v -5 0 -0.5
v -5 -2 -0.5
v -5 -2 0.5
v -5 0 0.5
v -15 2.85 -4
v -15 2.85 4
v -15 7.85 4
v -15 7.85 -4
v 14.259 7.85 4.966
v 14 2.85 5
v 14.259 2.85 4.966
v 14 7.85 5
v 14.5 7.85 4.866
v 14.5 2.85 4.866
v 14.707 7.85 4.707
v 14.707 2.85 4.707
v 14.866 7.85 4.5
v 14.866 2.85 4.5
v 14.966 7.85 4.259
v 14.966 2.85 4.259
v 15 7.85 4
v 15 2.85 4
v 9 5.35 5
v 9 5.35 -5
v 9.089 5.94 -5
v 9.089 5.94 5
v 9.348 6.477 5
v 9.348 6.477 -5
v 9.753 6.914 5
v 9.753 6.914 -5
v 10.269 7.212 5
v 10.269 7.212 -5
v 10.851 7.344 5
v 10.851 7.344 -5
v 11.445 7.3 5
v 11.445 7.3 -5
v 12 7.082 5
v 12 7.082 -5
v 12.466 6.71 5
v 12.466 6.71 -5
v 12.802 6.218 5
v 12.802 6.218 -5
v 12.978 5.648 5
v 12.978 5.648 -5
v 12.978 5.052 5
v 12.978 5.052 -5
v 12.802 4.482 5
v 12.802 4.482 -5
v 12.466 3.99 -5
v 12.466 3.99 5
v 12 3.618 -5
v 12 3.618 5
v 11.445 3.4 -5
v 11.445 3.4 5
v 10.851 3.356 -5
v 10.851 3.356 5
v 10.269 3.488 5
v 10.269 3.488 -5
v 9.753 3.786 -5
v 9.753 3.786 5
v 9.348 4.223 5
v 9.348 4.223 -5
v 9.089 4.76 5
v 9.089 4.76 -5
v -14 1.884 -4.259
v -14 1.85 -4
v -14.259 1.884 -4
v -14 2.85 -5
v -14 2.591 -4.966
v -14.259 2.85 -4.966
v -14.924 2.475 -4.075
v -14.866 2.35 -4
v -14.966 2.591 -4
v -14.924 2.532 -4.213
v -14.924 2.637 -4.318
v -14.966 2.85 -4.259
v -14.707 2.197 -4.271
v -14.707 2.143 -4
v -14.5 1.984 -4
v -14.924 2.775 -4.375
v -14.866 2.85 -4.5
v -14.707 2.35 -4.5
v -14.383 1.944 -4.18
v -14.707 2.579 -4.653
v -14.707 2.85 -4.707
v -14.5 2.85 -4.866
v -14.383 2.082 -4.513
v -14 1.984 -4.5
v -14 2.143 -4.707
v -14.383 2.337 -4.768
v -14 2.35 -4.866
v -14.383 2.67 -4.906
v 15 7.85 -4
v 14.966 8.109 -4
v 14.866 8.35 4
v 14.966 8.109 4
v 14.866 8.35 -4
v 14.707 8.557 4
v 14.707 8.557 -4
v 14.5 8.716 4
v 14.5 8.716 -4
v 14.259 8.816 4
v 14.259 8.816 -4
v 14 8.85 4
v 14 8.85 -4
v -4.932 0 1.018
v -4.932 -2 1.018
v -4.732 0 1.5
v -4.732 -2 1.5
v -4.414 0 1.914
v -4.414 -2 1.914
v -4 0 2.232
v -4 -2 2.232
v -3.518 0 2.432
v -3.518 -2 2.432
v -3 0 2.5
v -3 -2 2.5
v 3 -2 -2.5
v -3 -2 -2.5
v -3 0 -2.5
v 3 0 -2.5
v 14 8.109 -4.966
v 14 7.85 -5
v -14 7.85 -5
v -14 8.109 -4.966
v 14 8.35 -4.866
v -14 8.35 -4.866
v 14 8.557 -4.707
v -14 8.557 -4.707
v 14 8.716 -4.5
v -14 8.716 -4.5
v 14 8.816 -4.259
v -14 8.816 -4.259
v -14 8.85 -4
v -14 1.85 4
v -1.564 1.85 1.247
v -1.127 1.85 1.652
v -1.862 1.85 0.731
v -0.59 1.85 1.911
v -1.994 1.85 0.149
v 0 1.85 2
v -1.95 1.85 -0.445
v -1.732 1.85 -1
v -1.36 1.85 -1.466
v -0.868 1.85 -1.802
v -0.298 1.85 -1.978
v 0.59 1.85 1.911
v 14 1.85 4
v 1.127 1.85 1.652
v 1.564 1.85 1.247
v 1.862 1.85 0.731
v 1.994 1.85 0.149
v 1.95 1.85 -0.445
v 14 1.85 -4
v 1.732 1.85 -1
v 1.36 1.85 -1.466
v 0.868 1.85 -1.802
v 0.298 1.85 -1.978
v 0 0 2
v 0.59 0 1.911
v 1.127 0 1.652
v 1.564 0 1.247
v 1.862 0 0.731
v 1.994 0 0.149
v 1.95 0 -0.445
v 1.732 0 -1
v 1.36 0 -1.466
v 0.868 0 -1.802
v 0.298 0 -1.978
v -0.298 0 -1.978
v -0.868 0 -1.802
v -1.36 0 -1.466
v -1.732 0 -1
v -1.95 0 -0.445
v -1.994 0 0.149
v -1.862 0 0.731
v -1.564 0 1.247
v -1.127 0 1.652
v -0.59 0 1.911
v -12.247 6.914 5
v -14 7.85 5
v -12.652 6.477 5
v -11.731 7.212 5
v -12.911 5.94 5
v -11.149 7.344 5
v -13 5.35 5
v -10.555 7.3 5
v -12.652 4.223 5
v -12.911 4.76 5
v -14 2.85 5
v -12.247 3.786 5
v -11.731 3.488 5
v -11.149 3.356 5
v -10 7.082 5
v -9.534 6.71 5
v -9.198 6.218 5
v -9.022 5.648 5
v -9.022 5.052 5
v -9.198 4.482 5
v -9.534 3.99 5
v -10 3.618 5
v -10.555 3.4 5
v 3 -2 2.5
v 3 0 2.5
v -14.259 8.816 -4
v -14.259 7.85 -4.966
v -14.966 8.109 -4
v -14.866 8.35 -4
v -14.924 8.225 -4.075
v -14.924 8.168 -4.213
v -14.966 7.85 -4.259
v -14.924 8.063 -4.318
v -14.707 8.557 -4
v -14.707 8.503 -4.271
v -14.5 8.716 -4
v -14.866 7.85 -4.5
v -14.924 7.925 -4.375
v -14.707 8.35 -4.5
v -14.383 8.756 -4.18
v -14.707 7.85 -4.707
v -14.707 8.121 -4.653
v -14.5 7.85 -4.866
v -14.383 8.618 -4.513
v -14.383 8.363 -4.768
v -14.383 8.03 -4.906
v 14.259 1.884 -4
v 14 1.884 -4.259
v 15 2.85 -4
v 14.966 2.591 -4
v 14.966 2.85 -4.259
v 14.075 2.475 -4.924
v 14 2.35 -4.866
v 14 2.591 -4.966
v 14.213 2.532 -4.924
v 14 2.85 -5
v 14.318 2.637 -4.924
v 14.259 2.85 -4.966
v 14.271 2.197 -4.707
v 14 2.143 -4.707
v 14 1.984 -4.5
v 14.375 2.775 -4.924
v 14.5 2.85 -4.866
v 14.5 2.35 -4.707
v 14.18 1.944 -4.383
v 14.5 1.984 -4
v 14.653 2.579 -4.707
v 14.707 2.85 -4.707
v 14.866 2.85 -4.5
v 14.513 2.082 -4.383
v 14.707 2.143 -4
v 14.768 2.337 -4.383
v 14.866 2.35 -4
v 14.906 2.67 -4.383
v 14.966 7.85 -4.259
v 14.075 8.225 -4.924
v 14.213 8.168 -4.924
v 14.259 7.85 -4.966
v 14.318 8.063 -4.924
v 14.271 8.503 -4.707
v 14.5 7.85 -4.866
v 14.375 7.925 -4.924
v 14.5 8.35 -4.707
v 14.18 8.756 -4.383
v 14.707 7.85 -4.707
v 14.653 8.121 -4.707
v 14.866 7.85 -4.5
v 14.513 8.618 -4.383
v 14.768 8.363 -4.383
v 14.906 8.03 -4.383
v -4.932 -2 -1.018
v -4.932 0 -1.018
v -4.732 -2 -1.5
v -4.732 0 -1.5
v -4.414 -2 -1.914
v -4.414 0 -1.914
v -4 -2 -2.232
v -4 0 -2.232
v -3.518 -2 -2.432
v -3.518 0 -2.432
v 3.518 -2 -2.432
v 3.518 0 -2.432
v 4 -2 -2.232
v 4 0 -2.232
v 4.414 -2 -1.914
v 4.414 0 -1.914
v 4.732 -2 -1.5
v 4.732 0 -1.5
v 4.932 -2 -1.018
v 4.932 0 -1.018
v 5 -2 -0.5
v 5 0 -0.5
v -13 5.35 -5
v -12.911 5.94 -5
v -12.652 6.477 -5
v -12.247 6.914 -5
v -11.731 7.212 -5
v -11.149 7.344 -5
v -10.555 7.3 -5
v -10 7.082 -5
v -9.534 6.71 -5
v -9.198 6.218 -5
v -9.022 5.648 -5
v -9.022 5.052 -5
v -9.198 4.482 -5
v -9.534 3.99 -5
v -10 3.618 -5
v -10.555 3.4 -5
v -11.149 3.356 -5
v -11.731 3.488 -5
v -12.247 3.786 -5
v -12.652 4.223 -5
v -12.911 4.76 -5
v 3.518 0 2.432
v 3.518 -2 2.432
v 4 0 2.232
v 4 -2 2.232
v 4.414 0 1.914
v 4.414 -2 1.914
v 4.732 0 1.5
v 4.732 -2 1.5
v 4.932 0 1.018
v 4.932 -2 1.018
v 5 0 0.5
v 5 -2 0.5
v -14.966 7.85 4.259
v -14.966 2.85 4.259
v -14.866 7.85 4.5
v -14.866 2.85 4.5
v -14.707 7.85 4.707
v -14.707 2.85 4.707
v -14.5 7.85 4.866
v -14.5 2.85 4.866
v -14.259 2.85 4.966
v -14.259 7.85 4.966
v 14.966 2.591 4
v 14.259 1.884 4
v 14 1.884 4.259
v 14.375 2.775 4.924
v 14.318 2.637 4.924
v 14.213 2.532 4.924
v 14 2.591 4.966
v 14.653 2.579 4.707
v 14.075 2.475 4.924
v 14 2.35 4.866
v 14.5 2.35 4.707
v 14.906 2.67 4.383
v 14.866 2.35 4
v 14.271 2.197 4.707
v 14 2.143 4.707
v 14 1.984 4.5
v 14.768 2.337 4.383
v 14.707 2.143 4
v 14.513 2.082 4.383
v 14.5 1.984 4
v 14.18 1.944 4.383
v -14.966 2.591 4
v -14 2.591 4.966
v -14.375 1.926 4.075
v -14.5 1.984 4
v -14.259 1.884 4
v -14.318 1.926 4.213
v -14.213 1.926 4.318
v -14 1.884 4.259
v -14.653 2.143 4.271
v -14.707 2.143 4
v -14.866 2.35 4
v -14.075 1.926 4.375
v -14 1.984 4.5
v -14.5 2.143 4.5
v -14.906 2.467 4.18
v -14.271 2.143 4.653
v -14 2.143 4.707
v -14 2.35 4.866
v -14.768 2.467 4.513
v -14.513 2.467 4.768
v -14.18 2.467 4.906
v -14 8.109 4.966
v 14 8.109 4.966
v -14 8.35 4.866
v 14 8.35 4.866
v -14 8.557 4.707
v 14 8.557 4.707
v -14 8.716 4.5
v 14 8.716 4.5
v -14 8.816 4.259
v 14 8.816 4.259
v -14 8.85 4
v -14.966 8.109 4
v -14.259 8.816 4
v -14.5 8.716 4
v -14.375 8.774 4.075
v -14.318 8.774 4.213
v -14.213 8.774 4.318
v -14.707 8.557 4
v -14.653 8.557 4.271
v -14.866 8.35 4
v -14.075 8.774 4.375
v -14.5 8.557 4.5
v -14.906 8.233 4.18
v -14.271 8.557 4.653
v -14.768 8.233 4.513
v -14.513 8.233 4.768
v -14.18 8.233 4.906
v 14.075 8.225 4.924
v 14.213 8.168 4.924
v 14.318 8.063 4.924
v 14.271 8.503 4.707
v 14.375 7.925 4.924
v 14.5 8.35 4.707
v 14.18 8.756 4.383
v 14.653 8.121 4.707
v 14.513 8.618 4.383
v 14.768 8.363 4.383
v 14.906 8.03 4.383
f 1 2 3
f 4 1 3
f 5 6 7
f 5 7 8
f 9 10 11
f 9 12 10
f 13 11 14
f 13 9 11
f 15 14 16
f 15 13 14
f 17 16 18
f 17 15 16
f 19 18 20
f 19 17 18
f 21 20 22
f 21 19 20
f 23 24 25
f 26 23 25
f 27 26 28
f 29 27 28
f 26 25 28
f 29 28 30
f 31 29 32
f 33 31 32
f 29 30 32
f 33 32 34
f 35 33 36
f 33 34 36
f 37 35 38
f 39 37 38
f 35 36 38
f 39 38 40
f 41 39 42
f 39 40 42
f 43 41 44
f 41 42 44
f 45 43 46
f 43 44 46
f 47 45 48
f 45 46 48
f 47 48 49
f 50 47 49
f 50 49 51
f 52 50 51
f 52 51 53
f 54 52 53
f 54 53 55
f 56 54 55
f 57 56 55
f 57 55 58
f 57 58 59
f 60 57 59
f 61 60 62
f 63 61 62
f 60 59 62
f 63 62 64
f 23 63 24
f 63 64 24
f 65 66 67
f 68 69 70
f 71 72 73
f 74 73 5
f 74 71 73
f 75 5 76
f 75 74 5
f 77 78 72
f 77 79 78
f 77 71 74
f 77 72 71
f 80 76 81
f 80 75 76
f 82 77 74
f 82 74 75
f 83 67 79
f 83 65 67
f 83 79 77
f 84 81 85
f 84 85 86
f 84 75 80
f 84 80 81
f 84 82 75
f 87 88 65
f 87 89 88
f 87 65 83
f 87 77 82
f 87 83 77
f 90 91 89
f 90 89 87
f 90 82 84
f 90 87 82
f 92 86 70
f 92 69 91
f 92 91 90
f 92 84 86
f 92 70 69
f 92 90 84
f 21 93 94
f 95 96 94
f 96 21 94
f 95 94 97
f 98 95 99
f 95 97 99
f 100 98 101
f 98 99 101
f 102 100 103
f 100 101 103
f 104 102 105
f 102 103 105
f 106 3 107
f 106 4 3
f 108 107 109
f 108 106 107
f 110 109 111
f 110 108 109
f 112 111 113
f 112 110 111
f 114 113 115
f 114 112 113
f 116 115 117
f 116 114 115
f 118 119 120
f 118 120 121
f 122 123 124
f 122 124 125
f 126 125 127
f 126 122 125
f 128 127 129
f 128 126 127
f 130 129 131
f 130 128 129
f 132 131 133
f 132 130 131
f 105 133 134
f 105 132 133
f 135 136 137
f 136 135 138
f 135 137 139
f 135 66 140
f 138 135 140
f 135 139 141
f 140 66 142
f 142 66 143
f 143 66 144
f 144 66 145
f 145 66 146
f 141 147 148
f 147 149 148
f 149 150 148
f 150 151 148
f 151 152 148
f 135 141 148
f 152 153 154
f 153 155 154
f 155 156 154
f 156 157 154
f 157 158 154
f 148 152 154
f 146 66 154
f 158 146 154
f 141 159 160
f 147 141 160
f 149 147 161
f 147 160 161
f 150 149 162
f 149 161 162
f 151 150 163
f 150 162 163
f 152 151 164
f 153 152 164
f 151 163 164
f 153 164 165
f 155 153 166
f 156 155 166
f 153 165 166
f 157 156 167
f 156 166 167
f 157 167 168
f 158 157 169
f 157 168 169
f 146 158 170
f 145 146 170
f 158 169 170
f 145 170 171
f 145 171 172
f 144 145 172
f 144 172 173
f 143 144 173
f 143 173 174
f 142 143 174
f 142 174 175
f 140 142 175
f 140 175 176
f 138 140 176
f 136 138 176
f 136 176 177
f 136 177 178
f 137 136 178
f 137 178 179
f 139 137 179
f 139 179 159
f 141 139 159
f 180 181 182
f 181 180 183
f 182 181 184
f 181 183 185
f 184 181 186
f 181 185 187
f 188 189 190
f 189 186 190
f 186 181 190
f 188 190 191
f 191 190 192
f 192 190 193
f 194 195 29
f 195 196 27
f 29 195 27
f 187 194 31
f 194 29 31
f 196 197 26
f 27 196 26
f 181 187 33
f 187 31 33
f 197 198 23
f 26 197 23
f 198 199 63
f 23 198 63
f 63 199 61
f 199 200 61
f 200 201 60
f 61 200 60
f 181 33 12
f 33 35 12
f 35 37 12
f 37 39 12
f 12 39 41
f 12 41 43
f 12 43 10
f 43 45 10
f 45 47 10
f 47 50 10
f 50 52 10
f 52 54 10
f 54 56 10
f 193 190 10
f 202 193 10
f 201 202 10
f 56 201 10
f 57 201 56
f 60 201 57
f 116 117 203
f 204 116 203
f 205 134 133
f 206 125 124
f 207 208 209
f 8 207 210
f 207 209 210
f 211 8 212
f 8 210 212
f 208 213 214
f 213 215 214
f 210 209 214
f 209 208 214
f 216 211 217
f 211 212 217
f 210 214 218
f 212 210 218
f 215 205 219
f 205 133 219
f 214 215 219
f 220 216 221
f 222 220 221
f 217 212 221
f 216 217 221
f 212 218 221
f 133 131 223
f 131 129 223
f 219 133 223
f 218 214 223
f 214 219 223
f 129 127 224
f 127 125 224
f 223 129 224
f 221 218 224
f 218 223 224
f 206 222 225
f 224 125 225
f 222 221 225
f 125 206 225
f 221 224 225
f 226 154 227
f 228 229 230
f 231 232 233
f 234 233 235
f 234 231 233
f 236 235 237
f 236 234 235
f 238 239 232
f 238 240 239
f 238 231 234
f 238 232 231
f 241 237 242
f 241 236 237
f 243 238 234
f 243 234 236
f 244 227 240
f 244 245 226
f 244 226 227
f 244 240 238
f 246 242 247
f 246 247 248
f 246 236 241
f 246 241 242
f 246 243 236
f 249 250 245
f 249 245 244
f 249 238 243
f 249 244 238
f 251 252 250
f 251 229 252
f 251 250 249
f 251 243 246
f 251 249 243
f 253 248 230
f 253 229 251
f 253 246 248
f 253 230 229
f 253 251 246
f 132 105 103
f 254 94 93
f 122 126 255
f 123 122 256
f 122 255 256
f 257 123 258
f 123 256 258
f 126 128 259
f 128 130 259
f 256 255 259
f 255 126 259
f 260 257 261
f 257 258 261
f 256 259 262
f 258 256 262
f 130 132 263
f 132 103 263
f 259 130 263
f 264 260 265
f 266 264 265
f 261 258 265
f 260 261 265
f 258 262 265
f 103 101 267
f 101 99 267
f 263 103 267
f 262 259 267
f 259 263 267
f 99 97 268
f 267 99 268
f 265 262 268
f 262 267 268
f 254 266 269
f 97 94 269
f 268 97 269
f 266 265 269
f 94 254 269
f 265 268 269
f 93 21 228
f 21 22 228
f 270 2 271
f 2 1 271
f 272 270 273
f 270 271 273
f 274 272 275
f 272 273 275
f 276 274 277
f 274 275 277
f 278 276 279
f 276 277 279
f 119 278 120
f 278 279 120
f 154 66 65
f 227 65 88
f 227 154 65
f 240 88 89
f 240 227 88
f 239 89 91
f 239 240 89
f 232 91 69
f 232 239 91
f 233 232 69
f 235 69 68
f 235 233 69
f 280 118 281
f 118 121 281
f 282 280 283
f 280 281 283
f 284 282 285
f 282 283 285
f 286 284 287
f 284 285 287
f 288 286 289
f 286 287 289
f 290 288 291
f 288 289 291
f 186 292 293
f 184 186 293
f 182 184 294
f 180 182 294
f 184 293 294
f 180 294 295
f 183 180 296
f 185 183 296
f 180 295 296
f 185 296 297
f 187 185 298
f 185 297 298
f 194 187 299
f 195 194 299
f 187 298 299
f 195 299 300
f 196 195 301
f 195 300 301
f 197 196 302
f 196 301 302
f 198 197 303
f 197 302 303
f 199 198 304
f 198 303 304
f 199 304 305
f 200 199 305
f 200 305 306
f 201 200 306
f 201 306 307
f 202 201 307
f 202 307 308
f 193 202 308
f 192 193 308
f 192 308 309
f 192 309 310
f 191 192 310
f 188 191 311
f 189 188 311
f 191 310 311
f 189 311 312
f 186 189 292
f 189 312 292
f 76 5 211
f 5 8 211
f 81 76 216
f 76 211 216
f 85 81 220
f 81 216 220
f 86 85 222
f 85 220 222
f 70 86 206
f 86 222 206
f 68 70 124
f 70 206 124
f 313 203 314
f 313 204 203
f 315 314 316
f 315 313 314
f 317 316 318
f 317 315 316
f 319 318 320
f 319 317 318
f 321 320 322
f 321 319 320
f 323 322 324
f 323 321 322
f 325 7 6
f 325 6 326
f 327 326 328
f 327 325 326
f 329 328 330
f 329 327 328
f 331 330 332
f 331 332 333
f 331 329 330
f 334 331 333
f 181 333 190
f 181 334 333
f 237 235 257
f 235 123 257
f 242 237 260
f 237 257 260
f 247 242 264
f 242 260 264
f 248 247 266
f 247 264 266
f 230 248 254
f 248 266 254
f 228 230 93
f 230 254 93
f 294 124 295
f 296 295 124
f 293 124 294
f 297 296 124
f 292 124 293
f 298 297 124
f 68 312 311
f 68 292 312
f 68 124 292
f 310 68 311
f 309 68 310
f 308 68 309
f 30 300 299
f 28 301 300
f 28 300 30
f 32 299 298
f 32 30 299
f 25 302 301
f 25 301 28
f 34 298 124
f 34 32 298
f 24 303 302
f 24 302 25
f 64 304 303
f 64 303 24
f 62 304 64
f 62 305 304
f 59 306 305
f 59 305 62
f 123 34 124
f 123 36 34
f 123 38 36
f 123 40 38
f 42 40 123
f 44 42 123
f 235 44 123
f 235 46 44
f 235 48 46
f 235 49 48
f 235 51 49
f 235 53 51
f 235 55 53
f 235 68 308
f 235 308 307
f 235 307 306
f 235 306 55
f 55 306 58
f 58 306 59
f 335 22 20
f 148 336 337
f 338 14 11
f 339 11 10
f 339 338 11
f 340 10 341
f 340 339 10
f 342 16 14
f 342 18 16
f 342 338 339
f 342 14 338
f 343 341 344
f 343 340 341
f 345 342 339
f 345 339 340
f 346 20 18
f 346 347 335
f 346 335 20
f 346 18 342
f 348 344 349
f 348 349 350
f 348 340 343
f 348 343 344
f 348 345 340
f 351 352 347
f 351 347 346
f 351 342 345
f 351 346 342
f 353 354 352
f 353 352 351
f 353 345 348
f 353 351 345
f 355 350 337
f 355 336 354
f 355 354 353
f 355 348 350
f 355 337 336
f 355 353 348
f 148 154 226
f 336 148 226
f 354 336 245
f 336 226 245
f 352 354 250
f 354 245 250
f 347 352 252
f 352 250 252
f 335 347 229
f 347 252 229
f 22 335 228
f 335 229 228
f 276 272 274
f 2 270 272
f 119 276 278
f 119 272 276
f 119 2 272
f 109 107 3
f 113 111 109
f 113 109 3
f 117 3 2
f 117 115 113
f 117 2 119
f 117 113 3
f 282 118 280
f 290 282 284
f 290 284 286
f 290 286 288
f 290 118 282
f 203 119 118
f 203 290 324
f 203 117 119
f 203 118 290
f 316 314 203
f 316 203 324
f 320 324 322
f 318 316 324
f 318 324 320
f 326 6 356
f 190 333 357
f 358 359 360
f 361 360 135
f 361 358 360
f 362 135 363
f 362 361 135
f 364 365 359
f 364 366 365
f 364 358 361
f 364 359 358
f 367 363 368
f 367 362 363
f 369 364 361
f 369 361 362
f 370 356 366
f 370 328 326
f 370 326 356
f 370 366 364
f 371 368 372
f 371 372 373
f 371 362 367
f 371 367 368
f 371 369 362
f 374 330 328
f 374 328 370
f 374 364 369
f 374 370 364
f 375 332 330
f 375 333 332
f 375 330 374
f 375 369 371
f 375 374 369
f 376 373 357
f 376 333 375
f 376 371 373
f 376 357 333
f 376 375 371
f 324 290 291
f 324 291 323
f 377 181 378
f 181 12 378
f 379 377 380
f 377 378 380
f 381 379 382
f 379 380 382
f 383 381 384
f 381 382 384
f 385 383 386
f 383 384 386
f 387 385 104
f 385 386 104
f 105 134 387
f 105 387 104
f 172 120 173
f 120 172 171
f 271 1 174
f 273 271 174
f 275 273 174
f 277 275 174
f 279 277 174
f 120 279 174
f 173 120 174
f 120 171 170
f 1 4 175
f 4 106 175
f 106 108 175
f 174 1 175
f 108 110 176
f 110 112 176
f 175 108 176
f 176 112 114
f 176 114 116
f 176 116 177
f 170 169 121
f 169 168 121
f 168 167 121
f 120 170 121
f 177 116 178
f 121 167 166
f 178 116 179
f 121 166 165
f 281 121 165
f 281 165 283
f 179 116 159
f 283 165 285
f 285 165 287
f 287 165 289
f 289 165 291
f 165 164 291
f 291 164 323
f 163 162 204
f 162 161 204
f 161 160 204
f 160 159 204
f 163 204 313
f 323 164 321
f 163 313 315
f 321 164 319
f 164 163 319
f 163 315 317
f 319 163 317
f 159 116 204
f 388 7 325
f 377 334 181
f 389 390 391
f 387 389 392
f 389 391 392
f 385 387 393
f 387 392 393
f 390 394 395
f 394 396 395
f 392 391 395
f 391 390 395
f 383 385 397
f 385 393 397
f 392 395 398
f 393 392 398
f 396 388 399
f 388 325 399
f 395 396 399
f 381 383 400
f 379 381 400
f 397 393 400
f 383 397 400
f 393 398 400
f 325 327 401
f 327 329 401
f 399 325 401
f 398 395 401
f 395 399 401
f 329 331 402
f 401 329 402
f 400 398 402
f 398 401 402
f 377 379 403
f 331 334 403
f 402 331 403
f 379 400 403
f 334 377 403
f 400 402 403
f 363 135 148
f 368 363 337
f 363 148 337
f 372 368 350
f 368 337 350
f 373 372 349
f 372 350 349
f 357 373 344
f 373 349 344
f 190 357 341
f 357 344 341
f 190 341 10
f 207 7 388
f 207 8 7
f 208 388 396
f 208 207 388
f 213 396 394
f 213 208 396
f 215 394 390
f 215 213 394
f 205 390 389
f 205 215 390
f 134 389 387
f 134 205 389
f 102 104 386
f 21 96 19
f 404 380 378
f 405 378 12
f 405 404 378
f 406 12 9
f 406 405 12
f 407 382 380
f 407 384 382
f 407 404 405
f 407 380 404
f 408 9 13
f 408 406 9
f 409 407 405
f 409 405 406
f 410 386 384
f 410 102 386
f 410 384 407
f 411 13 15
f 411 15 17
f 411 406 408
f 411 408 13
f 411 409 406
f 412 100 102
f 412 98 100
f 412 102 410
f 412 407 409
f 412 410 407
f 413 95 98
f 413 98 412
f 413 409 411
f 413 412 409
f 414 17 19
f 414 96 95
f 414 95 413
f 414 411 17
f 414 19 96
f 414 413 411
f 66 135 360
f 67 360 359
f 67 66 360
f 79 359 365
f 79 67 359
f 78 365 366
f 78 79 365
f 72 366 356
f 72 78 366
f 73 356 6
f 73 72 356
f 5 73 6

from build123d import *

# Parameters (mm, degrees)
BOSS_EXTRUDE1_DEPTH      = 1.85
BOSS_EXTRUDE1_DEPTH_BACK = 2
SKETCH1_R                = 2
SKETCH3_W                = 30
SKETCH3_H                = 10
BOSS_EXTRUDE3_DEPTH      = 7
SKETCH7_W                = 10
SKETCH7_H                = 5
BOSS_EXTRUDE7_DEPTH      = 2
FILLET2_R                = 2
SKETCH9_R                = 2
CUT_EXTRUDE3_DEPTH       = 10
FILLET3_R                = 1


with BuildPart() as part:
    # Sketch1 → Boss-Extrude1 (new, two sides: drawn at the far end of the back side and taken through both)
    with BuildSketch(Plane(origin=(0, 0, 0), x_dir=(1, 0, 0), z_dir=(0, 1, 0)).offset(-BOSS_EXTRUDE1_DEPTH_BACK)):
        with Locations(Location((0, 0, 0), (0, 0, 270))):
            Circle(SKETCH1_R)
    extrude(amount=BOSS_EXTRUDE1_DEPTH + BOSS_EXTRUDE1_DEPTH_BACK)

    # Sketch3 → Boss-Extrude3 (add)
    with BuildSketch(Plane(origin=(0, 1.85, 0), x_dir=(1, 0, 0), z_dir=(0, 1, 0))):
        Rectangle(SKETCH3_W, SKETCH3_H)
    extrude(amount=BOSS_EXTRUDE3_DEPTH)

    # Sketch7 → Boss-Extrude7 (add)
    with BuildSketch(Plane.XZ.offset(2)):
        Rectangle(SKETCH7_W, SKETCH7_H)
    extrude(amount=-BOSS_EXTRUDE7_DEPTH)

    # Fillet2
    fillet2_edges = [part.edges().sort_by_distance(p)[0] for p in [
        (5, -1, 2.5),
        (5, -1, -2.5),
        (-5, -1, -2.5),
        (-5, -1, 2.5),
    ]]
    fillet(fillet2_edges, radius=FILLET2_R)

    # Sketch9 → Cut-Extrude3 (cut)
    with BuildSketch(Plane(origin=(0, 0, -5), x_dir=(-1, 0, 0), z_dir=(0, 0, -1))):
        with Locations((-11, 5.35)):
            Circle(SKETCH9_R)
        with Locations((11, 5.35)):
            Circle(SKETCH9_R)
    extrude(amount=-CUT_EXTRUDE3_DEPTH, mode=Mode.SUBTRACT)

    # Fillet3
    fillet3_edges = [part.edges().sort_by_distance(p)[0] for p in [
        (-15, 5.35, 5),
        (15, 8.85, 0),
        (0, 8.85, -5),
        (-15, 8.85, 0),
        (0, 8.85, 5),
        (15, 1.85, 0),
        (15, 5.35, 5),
        (0, 1.85, -5),
        (15, 5.35, -5),
        (-15, 1.85, 0),
        (-15, 5.35, -5),
        (0, 1.85, 5),
    ]]
    fillet(fillet3_edges, radius=FILLET3_R)


solid = part.part
